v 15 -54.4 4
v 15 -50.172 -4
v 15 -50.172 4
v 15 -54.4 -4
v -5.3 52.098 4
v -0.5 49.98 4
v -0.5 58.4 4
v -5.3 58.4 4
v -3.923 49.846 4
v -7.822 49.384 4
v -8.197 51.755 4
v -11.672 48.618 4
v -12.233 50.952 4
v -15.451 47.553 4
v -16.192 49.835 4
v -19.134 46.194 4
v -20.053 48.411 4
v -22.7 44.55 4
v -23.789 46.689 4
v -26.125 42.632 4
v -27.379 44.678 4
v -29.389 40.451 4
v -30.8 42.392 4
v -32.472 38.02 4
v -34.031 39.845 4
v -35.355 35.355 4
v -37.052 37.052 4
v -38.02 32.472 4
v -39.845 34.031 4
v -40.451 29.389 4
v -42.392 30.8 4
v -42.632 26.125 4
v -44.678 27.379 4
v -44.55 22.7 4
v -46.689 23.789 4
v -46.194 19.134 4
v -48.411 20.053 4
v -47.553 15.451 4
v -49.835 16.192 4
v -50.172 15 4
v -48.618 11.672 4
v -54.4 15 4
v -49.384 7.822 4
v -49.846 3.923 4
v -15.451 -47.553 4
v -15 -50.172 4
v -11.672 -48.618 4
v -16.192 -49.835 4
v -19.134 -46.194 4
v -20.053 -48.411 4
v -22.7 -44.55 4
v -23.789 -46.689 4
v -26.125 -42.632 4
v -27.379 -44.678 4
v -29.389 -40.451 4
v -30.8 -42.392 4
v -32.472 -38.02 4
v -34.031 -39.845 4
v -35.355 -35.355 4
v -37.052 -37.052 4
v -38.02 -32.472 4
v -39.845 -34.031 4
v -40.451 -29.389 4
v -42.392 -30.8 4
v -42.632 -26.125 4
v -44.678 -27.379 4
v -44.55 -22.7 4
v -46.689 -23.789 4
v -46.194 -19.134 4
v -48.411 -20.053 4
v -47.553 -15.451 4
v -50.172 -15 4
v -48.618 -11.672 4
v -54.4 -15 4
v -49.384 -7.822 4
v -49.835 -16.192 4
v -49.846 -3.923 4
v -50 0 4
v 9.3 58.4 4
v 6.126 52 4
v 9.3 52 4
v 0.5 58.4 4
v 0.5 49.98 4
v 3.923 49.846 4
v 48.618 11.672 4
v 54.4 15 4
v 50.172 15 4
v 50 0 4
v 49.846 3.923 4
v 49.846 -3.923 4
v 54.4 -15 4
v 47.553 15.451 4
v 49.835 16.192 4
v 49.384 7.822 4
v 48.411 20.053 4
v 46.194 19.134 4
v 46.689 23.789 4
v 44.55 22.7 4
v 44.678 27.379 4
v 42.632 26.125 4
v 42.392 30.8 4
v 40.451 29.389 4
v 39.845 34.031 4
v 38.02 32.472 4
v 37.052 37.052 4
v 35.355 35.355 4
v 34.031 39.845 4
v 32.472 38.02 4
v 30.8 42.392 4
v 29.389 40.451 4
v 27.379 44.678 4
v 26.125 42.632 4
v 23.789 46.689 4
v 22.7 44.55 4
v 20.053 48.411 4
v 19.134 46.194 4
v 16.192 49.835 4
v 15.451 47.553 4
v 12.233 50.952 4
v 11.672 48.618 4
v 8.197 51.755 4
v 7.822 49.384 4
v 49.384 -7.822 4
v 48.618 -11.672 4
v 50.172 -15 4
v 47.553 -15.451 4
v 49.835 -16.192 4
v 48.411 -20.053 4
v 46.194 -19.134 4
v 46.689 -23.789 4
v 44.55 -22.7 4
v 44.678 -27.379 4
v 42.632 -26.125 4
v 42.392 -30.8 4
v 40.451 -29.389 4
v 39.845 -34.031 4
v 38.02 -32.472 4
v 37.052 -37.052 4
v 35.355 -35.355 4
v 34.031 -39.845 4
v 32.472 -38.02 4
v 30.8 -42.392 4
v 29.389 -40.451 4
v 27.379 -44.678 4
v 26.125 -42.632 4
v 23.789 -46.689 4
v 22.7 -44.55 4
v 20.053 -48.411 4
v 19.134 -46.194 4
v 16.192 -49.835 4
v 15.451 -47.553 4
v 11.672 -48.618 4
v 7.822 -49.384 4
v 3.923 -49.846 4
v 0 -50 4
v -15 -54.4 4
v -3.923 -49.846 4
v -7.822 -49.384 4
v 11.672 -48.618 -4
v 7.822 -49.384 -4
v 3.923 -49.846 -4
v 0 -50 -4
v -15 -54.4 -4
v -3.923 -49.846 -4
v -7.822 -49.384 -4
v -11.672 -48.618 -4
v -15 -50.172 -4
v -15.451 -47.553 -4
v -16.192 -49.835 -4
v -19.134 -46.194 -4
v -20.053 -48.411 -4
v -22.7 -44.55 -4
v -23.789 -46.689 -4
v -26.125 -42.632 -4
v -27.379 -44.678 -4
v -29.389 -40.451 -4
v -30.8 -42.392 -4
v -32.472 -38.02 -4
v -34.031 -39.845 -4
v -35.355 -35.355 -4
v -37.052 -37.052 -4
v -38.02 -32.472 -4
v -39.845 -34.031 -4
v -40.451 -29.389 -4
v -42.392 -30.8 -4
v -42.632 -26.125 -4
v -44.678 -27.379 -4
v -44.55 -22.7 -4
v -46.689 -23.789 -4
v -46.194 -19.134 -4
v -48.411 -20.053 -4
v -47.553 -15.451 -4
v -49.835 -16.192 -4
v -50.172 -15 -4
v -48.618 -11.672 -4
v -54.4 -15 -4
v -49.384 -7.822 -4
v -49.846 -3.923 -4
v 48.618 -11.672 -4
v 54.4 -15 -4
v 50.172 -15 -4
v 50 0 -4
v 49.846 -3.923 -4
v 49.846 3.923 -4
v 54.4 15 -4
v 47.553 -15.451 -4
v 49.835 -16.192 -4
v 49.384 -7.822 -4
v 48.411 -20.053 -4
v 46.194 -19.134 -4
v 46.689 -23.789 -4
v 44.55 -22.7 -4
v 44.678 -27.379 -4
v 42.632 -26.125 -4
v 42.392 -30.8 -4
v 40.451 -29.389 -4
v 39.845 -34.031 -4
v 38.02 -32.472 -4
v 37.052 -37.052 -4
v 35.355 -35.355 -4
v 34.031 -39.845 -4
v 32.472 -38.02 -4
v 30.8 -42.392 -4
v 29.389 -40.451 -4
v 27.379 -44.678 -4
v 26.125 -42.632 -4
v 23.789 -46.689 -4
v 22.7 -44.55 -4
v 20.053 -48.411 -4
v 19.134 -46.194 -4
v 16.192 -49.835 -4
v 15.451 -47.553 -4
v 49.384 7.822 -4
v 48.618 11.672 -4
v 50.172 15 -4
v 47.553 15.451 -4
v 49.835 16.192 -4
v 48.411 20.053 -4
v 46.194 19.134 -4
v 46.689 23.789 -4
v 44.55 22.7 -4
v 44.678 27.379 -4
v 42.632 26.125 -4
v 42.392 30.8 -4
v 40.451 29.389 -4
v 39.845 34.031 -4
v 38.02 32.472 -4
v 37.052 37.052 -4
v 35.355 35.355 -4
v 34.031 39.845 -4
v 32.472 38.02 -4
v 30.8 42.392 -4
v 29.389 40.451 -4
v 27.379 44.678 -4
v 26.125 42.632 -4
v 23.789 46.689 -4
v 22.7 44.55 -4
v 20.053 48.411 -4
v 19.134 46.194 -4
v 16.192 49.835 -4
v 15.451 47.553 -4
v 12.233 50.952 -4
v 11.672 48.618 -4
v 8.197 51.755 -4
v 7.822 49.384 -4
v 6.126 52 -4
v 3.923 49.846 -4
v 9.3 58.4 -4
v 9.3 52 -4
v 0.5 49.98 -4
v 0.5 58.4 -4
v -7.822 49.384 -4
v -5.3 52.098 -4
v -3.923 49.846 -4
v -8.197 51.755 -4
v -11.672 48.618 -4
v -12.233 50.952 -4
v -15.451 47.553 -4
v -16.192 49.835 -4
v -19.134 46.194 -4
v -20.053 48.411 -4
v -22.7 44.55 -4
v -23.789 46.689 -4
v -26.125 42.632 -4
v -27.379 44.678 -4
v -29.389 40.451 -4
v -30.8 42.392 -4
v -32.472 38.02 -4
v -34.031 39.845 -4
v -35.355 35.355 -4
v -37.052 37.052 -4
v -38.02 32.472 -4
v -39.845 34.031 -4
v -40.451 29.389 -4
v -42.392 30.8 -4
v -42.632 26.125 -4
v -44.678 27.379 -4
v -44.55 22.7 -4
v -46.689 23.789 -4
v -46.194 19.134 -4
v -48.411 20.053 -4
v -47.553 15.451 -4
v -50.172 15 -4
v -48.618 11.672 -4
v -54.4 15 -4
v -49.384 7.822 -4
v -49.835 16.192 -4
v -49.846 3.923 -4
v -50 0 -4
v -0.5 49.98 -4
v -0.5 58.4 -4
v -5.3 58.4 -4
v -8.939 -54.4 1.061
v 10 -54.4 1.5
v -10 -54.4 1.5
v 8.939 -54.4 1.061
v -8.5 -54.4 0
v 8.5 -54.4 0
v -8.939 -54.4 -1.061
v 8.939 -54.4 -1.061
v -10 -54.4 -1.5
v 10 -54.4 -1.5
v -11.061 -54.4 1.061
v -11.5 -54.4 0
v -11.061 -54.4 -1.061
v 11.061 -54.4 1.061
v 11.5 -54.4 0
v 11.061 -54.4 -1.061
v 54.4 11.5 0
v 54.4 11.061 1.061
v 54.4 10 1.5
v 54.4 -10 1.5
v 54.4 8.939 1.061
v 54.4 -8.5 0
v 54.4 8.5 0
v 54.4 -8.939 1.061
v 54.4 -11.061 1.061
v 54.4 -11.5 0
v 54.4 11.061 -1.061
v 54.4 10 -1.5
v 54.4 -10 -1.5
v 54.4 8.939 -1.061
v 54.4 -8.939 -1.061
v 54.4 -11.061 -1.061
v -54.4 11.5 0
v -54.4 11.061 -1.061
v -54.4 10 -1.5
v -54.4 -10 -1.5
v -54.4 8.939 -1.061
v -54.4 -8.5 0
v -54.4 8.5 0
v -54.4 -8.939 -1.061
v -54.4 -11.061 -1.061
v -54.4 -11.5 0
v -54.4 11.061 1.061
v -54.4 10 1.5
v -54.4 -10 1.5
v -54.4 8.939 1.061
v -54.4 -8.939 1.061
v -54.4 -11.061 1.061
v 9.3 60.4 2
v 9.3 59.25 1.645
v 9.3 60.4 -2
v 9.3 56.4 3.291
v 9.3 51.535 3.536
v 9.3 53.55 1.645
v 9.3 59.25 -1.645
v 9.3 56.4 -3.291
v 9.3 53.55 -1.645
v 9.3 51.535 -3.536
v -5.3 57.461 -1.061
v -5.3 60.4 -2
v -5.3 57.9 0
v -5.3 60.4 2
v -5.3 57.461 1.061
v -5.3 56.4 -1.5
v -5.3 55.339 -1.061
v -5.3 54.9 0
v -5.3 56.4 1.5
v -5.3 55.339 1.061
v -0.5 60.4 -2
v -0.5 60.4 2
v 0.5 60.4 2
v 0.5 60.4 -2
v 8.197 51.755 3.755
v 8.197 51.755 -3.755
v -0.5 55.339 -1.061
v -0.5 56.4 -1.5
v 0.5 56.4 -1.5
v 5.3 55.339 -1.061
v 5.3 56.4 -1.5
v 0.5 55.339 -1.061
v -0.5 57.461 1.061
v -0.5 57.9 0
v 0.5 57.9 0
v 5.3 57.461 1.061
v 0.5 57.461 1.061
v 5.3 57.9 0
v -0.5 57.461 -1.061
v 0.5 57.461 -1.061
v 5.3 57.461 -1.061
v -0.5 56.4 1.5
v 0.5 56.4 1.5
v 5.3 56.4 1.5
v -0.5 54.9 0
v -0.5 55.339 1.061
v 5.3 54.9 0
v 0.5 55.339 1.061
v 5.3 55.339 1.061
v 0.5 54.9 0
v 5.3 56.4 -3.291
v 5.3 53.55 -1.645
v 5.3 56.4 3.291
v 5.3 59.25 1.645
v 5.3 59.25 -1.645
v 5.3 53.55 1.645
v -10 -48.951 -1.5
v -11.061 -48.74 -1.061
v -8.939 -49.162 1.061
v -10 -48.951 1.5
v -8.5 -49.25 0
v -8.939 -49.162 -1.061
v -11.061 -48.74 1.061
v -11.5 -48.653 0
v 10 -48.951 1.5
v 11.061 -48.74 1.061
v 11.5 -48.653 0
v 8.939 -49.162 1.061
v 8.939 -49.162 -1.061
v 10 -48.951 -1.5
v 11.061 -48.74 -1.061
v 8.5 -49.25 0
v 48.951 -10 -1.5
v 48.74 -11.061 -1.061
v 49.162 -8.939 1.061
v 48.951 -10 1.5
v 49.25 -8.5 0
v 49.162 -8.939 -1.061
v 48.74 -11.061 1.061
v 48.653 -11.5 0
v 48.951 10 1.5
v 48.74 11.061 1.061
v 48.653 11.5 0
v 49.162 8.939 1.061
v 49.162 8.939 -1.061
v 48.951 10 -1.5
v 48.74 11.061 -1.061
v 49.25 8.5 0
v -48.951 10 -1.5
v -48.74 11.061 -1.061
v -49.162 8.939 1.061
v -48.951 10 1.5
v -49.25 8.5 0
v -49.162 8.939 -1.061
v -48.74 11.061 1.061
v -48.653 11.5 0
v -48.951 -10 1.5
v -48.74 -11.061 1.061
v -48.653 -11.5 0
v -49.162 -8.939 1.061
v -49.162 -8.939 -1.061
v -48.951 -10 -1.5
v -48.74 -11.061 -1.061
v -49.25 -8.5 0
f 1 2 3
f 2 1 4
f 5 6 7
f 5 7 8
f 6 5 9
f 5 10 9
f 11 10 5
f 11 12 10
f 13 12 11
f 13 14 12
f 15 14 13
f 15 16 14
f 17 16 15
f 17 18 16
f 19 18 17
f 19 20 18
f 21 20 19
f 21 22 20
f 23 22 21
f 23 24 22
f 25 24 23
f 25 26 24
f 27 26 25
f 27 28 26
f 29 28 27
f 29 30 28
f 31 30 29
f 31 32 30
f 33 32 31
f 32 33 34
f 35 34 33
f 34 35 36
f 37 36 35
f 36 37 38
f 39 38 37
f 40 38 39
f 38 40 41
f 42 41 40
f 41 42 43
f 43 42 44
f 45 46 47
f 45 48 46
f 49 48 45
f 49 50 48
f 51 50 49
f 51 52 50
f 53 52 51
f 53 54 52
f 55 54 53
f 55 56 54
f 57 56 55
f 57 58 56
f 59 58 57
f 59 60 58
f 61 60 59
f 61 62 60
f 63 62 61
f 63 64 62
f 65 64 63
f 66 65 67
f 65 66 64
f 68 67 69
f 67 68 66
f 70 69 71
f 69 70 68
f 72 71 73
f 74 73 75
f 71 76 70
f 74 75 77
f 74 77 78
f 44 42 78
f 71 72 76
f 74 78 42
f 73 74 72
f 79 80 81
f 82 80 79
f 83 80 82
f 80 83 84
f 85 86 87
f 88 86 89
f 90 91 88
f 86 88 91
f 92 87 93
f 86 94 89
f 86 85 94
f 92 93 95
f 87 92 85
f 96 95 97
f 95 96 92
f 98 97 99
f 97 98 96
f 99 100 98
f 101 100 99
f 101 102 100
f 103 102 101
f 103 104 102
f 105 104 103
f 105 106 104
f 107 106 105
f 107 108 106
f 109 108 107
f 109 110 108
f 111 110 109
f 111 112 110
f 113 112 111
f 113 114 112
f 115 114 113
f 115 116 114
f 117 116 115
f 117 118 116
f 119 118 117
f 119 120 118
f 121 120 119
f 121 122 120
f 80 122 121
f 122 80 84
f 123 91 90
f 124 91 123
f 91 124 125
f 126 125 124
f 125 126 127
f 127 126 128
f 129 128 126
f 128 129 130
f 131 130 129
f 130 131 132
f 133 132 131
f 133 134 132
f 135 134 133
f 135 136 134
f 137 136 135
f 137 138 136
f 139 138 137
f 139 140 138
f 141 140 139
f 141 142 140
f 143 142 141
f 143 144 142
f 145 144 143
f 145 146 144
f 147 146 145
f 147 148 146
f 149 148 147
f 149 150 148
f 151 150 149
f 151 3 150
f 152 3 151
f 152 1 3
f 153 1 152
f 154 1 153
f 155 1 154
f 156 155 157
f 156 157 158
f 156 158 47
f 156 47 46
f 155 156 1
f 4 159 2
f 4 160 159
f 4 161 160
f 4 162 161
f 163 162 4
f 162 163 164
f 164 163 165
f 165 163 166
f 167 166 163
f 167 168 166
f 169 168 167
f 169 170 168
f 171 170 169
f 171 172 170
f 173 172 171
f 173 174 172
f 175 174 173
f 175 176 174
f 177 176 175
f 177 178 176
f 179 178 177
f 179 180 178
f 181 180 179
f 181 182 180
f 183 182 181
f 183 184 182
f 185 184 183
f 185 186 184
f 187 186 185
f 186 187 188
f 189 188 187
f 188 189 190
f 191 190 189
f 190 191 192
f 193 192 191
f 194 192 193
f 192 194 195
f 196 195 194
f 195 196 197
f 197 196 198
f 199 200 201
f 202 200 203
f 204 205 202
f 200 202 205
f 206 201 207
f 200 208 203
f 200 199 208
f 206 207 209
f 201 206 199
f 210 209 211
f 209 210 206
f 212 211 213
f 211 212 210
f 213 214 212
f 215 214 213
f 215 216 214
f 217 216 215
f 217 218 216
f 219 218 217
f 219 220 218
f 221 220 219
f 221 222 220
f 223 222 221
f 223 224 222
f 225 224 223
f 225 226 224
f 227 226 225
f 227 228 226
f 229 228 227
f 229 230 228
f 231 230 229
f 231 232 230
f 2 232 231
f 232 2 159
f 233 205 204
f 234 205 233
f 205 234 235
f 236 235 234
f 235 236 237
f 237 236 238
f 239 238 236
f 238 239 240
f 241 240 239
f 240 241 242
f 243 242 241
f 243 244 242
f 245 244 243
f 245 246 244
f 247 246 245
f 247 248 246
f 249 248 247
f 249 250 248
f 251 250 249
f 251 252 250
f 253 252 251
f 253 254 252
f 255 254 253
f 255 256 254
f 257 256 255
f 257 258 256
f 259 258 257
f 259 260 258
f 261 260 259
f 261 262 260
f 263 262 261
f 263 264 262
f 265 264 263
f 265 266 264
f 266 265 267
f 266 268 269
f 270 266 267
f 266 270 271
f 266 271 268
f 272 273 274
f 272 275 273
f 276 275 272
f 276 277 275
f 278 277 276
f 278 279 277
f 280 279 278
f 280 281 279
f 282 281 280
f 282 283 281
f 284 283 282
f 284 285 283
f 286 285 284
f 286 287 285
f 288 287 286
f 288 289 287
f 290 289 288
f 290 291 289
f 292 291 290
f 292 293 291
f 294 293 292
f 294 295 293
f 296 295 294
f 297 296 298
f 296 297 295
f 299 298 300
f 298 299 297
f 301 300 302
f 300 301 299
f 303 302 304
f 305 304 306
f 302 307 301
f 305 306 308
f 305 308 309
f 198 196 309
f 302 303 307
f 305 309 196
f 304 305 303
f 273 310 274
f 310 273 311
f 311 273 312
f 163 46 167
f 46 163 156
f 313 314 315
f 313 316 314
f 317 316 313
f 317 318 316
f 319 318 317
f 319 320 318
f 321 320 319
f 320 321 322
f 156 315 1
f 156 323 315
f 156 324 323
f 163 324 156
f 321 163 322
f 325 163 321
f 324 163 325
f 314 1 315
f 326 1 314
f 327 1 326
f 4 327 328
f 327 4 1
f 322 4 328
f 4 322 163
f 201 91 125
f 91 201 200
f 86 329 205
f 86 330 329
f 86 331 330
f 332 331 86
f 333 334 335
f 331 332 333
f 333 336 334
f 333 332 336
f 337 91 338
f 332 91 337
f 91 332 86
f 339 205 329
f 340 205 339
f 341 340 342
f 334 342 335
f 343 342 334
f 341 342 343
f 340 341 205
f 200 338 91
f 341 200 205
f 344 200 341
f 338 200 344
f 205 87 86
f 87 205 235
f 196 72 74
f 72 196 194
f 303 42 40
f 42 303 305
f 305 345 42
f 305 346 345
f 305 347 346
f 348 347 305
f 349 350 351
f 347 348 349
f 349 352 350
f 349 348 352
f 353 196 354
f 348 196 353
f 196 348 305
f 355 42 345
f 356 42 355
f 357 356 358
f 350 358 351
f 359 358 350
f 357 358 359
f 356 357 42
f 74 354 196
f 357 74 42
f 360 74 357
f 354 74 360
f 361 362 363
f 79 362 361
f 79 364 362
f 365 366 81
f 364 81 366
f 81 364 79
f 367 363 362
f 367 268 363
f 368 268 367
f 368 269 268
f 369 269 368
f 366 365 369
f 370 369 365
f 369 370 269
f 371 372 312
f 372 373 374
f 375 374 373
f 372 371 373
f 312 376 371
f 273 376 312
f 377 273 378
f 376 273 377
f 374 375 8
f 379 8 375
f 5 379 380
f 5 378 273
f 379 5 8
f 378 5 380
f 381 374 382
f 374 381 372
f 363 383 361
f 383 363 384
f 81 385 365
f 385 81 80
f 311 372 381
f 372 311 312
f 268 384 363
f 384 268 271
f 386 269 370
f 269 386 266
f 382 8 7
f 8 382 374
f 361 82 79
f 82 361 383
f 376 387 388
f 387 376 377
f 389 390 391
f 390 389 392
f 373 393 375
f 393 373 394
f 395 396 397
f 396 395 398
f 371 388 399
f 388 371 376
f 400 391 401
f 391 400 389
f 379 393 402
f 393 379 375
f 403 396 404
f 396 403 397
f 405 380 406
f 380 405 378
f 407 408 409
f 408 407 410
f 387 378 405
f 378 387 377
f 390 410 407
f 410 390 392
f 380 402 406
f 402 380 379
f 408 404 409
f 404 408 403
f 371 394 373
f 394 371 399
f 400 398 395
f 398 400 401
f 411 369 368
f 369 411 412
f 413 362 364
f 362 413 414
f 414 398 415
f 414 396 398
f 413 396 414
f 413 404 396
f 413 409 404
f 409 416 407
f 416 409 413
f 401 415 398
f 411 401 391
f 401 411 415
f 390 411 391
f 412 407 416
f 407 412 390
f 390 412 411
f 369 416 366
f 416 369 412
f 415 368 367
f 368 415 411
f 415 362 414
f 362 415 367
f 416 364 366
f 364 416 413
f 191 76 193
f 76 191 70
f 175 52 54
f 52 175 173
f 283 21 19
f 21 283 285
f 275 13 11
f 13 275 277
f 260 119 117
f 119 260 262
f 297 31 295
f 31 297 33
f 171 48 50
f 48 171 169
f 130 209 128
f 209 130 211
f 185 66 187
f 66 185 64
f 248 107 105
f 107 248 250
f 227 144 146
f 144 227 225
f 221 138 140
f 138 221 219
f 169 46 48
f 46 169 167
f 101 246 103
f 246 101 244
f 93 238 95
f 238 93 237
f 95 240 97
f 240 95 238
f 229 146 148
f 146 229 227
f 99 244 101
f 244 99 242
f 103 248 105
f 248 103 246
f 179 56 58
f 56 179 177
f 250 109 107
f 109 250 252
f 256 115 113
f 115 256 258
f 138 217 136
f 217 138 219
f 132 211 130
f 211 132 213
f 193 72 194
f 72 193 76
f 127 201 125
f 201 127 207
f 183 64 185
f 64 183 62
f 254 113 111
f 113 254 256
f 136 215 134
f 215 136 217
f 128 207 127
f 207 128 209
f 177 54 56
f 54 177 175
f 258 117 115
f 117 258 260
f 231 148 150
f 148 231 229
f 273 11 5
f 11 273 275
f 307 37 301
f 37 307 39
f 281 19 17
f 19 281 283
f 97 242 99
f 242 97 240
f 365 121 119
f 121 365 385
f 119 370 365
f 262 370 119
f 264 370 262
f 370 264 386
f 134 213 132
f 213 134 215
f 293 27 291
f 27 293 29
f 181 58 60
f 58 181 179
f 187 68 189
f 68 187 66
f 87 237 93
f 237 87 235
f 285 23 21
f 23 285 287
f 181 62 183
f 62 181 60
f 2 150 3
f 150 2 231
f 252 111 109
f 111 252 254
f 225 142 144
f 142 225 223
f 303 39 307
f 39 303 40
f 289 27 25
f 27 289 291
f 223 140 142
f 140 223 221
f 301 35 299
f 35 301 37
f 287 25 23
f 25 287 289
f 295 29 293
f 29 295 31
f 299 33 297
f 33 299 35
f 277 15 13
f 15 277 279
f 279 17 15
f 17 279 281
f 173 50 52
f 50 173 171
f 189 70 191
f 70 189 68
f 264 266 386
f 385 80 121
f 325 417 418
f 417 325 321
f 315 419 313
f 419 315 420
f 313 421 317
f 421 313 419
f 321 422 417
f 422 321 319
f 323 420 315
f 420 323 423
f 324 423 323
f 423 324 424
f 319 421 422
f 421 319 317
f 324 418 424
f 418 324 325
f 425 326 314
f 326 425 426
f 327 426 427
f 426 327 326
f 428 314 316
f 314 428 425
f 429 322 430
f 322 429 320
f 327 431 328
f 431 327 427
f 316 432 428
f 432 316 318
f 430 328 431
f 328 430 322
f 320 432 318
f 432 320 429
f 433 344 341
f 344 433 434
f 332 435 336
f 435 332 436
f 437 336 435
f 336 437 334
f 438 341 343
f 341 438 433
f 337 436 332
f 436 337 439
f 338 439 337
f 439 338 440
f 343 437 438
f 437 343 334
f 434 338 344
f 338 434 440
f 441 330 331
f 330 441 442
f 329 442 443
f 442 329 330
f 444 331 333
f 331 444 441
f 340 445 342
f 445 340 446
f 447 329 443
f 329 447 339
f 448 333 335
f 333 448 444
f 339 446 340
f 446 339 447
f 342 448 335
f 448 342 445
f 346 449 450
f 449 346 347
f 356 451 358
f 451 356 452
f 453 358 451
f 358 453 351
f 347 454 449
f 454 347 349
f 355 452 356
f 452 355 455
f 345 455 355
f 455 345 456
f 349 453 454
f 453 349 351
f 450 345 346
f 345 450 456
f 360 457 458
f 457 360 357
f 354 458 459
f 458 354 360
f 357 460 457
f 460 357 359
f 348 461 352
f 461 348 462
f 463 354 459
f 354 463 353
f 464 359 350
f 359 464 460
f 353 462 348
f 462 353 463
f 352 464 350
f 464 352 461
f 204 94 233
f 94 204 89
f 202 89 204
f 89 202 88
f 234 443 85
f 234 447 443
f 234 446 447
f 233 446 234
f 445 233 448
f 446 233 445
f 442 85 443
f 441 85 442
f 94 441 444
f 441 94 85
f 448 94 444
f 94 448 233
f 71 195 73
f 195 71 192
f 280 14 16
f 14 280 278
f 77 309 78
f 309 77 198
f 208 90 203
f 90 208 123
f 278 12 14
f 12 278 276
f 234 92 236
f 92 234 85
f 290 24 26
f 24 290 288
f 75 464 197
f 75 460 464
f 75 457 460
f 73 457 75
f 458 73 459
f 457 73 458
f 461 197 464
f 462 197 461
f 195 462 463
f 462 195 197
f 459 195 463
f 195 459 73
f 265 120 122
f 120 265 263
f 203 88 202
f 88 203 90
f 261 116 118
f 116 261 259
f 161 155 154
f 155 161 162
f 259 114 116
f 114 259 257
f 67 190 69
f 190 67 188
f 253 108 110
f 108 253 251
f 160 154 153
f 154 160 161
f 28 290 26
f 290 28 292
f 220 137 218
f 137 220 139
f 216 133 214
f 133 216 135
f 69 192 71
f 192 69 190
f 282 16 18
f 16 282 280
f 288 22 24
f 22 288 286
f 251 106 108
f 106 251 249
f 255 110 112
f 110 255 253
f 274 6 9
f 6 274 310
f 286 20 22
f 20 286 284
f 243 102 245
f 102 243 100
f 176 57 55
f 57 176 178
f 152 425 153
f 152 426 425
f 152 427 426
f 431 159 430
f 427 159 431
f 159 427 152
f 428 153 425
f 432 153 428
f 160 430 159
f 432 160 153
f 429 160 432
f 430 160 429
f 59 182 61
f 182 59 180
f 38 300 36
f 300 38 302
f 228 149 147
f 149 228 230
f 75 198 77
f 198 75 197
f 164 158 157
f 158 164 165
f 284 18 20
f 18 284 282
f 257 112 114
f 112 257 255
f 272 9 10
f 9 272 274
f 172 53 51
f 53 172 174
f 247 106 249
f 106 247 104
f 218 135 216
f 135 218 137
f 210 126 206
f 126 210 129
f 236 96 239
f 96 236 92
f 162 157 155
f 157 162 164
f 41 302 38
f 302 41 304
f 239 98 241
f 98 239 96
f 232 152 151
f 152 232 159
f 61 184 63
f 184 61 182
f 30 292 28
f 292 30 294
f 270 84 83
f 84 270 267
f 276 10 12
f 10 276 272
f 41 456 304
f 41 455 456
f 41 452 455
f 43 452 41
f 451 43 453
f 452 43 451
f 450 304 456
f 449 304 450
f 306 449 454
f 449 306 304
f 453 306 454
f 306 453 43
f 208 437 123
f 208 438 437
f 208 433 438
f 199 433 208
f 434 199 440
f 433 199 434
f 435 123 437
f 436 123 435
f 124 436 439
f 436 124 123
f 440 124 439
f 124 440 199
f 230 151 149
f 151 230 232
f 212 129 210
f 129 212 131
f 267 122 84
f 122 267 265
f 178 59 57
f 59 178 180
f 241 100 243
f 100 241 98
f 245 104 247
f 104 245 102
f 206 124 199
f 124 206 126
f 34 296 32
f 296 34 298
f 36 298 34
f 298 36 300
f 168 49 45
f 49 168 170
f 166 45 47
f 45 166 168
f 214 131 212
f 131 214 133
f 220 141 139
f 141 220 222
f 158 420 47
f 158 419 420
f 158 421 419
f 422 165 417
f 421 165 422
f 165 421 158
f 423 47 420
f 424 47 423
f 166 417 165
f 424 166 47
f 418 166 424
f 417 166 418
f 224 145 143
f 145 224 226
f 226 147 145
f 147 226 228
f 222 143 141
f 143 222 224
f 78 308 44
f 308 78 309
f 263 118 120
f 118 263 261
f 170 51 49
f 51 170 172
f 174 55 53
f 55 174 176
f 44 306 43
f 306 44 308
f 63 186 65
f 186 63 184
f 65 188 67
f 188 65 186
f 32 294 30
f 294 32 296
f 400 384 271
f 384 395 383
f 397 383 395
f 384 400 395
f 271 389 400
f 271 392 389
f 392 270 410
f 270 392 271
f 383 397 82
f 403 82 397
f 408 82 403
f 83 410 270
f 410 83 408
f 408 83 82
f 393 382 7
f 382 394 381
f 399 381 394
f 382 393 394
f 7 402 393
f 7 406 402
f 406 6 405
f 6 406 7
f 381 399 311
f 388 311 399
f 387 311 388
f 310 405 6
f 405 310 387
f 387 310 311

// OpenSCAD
/* A parametric clamp with support holes for attaching stuff to a cylinder */

use <MCAD/boxes.scad>

diameter = 100;     // inner diameter of the clamp
thickness = 2.4;    // radial thickness
width = 8;          // axial length of the clamp
nutSize = 5.7;      // side-to-side dimension of the hexagonal nut
nutThickness = 4;
screwDiam = 3.0;    // diameter of the closing screw
doubleOpening = false;
gap = 1;            // opening gap

// Support platforms
supportLength = 30;
supportThickness = 2;
supportAngles = [0, 90, -90];  // number and position of support platforms
holeDiam = 3.0;     // diameter of support holes
holeSep = 20;       // separation between support holes

extRadius = diameter/2 + thickness;


difference() {
    union() {
        // external contour
        cylinder(width, extRadius, extRadius, center=true, $fn=80);

        // support platforms
        for (i = supportAngles) {
            rotate(i) translate([0, -extRadius, 0]) support();
        }
        // opening
        opening();
        if (doubleOpening) {
            mirror([0, 1, 0]) opening();
        }
    }
    // inner contour
    cylinder(width+1, diameter/2, diameter/2, center=true, $fn=80);
    // gap
    gap();
    if (doubleOpening) {
        mirror([0, 1, 0]) gap();
    }
    // support holes
    for (i = supportAngles) {
        rotate(i) translate([0, -extRadius, 0]) supportHoles();
    }
}

module opening() {
    difference() {
        holeXPos = thickness*2 + gap/2;
        holeYPos = thickness + (diameter + width)/2;
        w = 2*holeXPos + nutThickness;

        // screw support
        translate([-holeXPos, diameter/2, -width/2]) {
            chamferCube([w, thickness + width, width], 2);
        }
        // screw hole
        translate([-holeXPos, holeYPos, 0]) {
            rotate([0, 90, 0]) cylinder(w, d=screwDiam, $fn=8);
        }
        // nut trap
        translate([holeXPos, holeYPos, 0]) {
            rotate([0, 90, 0]) cylinder(nutThickness, r=nutSize/2/cos(30), $fn=6);
        }
    }
}

module gap() {
    translate([0, extRadius, 0]) cube([gap, extRadius, width+1], center=true);
}

module support() {
    l = supportLength;
    translate([-l/2, -supportThickness, -width/2]) cube([l, l, width], 1);
}

module supportHoles() {
    l = supportLength;
    for (i = [-holeSep/2, holeSep/2]) {
        translate([i, l-supportThickness-1, 0])
            rotate([90, 0, 0]) cylinder(l, d=holeDiam, $fn=8);
    }
}

module chamferCube(size, x) {
    translate(size/2) {
        intersection() {
            cube(size, center=true);
            a = (size[1]+size[2]-2*x)/sqrt(2);
            rotate([45, 0, 0]) cube([size[0], a, a], center=true);
        }
    }
}
